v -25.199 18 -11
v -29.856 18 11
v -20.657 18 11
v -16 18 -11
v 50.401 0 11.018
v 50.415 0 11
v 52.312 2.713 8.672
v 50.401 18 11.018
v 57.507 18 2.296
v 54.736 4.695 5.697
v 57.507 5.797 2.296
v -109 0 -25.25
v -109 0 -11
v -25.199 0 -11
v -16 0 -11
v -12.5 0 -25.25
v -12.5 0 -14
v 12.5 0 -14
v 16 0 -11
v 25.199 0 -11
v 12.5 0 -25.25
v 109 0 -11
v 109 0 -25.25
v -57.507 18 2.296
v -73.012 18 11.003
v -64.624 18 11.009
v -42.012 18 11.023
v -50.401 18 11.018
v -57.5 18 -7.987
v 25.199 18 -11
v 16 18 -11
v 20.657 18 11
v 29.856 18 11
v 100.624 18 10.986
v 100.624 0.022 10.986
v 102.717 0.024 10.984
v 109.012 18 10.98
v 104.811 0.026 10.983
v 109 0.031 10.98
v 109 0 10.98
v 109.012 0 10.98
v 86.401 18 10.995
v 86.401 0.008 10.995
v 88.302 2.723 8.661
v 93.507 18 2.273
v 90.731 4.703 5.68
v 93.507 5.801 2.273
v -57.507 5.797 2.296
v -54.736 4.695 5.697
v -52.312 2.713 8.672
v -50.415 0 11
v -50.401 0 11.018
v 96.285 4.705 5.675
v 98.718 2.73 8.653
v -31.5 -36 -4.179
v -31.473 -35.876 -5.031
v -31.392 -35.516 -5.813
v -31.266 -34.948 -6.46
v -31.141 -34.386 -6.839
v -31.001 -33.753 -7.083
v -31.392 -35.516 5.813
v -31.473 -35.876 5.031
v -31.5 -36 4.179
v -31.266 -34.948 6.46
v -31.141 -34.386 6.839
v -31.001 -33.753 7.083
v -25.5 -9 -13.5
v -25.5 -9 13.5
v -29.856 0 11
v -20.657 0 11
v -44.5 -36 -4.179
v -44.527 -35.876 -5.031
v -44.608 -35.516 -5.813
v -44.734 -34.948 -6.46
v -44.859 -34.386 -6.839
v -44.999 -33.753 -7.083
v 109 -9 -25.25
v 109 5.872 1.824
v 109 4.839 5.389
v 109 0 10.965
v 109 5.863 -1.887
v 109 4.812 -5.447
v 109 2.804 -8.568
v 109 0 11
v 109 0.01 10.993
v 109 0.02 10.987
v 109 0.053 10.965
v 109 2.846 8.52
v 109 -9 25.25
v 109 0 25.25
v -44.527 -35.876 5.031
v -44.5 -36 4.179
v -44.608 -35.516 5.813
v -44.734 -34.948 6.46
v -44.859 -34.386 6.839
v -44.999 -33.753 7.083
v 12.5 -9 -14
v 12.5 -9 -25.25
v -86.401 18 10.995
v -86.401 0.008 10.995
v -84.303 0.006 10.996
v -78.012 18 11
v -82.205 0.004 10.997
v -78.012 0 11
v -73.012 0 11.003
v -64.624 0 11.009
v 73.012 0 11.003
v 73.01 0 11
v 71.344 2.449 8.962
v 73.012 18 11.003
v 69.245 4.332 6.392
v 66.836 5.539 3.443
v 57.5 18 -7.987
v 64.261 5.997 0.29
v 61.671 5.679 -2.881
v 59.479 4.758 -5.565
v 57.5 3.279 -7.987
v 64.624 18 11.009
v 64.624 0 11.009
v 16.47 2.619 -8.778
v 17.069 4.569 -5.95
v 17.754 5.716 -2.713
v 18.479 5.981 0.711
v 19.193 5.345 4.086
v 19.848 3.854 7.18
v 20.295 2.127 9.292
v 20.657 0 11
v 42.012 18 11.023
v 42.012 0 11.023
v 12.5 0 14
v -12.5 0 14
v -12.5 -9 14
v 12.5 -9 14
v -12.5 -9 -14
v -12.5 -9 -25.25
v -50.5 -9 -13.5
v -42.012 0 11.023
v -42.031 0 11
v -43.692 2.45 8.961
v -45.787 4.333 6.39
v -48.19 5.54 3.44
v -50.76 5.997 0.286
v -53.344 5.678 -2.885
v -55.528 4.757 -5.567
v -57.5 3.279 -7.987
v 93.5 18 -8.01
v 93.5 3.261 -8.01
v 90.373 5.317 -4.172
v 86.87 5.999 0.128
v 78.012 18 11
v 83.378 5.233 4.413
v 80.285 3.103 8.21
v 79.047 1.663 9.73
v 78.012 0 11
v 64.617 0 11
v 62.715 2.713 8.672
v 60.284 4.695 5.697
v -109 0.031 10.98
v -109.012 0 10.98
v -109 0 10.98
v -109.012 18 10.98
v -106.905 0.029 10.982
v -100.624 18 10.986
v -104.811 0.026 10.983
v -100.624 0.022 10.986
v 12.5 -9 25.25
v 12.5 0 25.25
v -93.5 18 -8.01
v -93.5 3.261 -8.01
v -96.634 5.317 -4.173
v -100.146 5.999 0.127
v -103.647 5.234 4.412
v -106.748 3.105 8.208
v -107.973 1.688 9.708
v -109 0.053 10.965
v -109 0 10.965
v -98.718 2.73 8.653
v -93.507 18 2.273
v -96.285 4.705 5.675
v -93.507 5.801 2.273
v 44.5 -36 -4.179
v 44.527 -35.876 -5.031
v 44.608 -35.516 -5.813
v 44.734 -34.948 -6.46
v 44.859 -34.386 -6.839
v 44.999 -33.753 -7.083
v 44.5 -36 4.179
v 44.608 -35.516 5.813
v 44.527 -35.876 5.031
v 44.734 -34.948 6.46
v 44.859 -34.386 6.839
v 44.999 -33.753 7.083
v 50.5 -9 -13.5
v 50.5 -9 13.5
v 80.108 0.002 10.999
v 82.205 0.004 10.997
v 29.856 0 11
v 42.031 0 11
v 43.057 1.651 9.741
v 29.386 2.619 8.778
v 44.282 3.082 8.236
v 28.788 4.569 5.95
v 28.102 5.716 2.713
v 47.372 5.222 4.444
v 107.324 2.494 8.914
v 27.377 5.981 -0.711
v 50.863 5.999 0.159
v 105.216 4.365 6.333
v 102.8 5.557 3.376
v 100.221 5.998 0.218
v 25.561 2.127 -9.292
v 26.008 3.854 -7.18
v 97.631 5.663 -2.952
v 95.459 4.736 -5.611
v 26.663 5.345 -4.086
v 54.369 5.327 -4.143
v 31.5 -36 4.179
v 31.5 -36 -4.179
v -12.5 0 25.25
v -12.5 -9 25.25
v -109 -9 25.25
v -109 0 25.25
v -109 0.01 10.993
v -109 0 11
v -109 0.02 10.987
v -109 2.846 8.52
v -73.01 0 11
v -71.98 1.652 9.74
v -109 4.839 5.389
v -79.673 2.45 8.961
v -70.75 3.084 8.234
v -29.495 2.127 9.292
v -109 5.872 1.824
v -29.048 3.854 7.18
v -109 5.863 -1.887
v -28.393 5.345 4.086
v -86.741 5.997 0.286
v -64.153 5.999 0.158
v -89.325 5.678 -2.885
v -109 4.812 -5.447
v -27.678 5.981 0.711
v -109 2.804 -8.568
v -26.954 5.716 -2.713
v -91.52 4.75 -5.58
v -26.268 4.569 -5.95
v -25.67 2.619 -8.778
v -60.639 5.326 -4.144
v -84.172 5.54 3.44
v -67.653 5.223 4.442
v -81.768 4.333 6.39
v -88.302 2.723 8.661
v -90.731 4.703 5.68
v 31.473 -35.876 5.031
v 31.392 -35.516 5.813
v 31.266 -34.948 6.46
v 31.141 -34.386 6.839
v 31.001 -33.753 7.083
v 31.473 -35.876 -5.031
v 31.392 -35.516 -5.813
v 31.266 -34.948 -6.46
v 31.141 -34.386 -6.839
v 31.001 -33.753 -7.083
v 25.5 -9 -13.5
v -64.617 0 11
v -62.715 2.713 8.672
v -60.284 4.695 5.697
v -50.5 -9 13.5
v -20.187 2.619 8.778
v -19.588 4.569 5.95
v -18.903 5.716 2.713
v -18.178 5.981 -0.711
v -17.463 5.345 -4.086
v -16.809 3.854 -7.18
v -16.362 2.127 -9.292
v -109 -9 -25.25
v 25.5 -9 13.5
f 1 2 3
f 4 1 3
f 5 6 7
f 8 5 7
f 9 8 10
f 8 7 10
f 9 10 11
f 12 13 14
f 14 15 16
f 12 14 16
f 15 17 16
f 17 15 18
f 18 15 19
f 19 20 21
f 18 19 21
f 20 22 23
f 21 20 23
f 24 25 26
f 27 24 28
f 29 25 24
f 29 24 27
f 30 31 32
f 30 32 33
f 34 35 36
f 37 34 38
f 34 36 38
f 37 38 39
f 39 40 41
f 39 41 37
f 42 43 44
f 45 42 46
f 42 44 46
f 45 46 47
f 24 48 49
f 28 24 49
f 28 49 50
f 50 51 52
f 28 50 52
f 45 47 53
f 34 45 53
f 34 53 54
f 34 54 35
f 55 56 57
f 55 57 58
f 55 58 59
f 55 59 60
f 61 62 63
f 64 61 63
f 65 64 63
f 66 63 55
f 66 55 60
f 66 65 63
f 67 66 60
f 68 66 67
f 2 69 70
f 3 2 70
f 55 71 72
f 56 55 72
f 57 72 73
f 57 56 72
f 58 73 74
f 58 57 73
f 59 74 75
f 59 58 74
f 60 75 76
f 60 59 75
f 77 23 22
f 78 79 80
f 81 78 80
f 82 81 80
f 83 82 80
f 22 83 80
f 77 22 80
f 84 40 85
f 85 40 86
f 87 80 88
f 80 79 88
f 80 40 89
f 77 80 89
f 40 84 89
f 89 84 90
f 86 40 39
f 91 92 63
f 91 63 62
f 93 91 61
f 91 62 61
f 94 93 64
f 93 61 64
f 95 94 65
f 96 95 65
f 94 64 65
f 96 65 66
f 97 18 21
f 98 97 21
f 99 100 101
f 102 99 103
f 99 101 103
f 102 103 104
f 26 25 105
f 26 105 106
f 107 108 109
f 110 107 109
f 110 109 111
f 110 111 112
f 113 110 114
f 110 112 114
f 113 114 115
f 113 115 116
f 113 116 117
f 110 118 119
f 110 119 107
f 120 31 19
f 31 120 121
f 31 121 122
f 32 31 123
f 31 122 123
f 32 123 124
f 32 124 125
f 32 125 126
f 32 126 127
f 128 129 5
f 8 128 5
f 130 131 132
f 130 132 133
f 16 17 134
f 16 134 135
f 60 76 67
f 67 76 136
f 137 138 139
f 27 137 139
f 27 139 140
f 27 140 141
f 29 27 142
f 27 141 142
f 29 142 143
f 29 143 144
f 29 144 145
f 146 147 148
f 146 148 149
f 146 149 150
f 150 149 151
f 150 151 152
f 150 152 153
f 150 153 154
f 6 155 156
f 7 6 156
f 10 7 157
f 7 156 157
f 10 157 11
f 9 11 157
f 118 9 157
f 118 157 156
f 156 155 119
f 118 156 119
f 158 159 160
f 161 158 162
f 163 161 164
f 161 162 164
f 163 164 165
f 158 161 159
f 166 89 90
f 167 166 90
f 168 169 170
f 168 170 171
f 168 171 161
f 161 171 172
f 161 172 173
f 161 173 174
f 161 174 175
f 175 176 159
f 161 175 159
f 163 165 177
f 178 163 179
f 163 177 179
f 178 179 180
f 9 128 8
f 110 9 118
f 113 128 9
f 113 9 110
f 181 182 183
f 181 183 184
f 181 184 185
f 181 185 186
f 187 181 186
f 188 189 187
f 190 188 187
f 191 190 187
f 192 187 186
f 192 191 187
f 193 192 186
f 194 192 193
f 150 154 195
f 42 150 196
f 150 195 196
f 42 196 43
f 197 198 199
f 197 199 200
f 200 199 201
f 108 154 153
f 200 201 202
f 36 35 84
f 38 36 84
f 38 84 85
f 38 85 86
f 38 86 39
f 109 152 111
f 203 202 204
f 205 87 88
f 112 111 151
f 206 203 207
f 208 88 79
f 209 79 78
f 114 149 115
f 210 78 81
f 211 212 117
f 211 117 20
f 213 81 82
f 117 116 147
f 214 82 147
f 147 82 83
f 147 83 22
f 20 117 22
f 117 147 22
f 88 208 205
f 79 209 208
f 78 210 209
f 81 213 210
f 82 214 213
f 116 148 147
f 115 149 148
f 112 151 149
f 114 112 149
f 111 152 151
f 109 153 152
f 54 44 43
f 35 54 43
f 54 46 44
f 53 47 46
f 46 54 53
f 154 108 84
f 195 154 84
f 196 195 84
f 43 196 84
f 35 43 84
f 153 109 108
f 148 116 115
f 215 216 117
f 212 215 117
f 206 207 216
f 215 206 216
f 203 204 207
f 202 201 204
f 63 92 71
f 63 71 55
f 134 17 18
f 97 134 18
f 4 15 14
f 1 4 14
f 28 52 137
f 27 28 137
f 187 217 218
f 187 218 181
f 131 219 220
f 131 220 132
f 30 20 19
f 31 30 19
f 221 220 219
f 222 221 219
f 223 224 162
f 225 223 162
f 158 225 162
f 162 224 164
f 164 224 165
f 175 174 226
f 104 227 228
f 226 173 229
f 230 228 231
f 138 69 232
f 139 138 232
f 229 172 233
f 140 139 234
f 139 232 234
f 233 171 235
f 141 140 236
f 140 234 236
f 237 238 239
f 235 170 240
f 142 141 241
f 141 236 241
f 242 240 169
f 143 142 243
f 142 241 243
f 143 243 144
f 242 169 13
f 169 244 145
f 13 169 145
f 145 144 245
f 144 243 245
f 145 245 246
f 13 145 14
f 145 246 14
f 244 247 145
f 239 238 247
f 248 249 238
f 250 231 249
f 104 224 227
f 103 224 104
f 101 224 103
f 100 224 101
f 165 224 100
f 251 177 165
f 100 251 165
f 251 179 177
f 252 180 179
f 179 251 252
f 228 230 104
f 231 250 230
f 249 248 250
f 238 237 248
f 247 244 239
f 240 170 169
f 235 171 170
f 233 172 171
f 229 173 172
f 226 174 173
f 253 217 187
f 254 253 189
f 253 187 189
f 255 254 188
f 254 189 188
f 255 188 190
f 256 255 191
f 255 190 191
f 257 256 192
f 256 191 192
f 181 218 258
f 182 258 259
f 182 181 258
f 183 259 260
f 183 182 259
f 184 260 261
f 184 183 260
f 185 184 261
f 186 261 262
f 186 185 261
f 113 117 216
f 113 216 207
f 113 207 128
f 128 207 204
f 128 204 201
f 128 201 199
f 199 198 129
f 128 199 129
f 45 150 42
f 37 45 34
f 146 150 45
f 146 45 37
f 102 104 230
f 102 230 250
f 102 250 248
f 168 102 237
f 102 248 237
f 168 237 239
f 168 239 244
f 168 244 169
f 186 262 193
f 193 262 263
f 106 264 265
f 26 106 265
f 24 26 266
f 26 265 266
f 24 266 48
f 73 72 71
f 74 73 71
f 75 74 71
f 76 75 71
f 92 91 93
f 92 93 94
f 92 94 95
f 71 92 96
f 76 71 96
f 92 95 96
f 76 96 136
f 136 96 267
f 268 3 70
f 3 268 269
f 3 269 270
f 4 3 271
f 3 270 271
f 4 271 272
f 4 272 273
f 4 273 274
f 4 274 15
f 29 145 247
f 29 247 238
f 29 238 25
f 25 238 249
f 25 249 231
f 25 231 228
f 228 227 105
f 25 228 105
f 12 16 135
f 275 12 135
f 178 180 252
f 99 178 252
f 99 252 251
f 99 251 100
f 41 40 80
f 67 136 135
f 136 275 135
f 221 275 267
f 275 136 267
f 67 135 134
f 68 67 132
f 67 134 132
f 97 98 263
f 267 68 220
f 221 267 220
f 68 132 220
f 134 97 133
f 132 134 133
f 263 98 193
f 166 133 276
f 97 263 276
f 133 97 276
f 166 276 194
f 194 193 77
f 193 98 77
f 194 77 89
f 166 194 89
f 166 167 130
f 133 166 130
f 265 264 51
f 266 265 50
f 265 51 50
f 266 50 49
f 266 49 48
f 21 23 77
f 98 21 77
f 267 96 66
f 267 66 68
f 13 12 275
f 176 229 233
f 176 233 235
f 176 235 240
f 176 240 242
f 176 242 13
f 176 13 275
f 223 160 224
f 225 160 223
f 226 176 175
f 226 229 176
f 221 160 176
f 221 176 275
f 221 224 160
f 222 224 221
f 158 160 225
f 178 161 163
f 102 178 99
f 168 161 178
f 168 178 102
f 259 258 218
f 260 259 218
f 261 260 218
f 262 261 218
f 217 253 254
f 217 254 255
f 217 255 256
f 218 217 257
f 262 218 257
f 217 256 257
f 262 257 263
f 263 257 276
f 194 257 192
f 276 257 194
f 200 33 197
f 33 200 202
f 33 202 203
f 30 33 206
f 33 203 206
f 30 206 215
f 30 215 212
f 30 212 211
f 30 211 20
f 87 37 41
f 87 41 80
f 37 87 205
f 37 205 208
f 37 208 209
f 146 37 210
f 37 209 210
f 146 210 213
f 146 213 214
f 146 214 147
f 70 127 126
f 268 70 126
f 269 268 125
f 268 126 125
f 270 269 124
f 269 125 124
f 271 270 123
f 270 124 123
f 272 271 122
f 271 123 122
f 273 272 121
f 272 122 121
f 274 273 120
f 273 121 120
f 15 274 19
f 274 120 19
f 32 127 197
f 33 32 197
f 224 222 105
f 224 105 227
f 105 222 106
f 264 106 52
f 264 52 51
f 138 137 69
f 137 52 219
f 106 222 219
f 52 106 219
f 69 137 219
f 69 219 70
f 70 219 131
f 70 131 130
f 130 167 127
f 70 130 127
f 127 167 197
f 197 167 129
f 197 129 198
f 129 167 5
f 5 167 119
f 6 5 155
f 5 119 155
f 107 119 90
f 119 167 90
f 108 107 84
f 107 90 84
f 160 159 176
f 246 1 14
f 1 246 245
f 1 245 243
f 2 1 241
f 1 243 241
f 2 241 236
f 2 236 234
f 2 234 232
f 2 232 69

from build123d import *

# Parameters (mm, degrees)
EXTRUDE_1_DEPTH     = 109
EXTRUDE_2_DEPTH     = 18
SKETCH_3_W          = 25
SKETCH_3_H          = 11.25
CUT_EXTRUDE_1_DEPTH = 18
SKETCH_4_W          = 25
SKETCH_4_H          = 27
EXTRUDE_3_DEPTH     = 27
CUT_EXTRUDE_2_DEPTH = 122.166018853
CUT_EXTRUDE_3_DEPTH = 166.462013552
FILLET_1_R          = 3


# Read off the part's stored shape, not the designer's step: Бобышка-Вытянуть2
with BuildPart() as part:
    # Эскиз1 → Бобышка-Вытянуть1 (new, symmetric)
    with BuildSketch(Plane(origin=(0, 0, 0), x_dir=(0, 0, -1), z_dir=(1, 0, 0))):
        with BuildLine():
            Line((11, 0), (25.25, 0))
            Line((25.25, 0), (25.25, -9))
            Line((25.25, -9), (-25.25, -9))
            Line((-25.25, -9), (-25.25, 0))
            Line((-25.25, 0), (-11, 0))
            ThreePointArc((-11, 0), (0, 6), (11, 0))
        make_face()
    extrude(amount=EXTRUDE_1_DEPTH, both=True)

    # Бобышка-Вытянуть2 outline → Бобышка-Вытянуть2 (add)
    with BuildSketch(Plane(origin=(0, 0, 0), x_dir=(1, 0, 0), z_dir=(0, 1, 0))):
        Polygon((16, 11), (20.656976684, -11), (29.856406461, -11), (25.199429777, 11), align=None)
        Polygon((-29.856406461, -11), (-20.656976684, -11), (-16, 11), (-25.199429777, 11), align=None)
        Polygon((78.012123179, -10.999996132), (86.400679256, -10.994643711), (93.506557878, -2.272856192), (100.623560797, -10.985568626), (109.012116871, -10.980216204), (93.499996845, 8.009889964), align=None)
        Polygon((64.623554487, -11.008538874), (73.012110561, -11.003186452), (57.499990534, 7.986919716), (42.012116871, -11.02296638), (50.400672946, -11.017613959), (57.506551567, -2.29582644), align=None)
        Polygon((-109.012116871, -10.980216204), (-100.623560797, -10.985568626), (-93.506557878, -2.272856192), (-86.400679256, -10.994643711), (-78.012123179, -10.999996132), (-93.499996845, 8.009889964), align=None)
        Polygon((-73.012110561, -11.003186452), (-64.623554487, -11.008538874), (-57.506551567, -2.29582644), (-50.400672946, -11.017613959), (-42.012116871, -11.02296638), (-57.499990534, 7.986919716), align=None)
    extrude(amount=EXTRUDE_2_DEPTH)

    # Эскиз3 → Вырез-Вытянуть1 (cut)
    with BuildSketch(Plane(origin=(0, 0, 0), x_dir=(1, 0, 0), z_dir=(0, 1, 0))):
        with Locations((0, 19.625)):
            Rectangle(SKETCH_3_W, SKETCH_3_H)
        with Locations((0, -19.625)):
            Rectangle(SKETCH_3_W, SKETCH_3_H)
    extrude(amount=-CUT_EXTRUDE_1_DEPTH, mode=Mode.SUBTRACT)

    # Эскиз4 → Бобышка-Вытянуть3 (add)
    with BuildSketch(Plane.XZ.offset(9)):
        with Locations((38, 0)):
            Rectangle(SKETCH_4_W, SKETCH_4_H)
        with Locations((-38, 0)):
            Rectangle(SKETCH_4_W, SKETCH_4_H)
    extrude(amount=EXTRUDE_3_DEPTH)

    # Эскиз6 → Вырез-Вытянуть2 (cut, through all)
    with BuildSketch(Plane.XY.offset(13.5)):
        Polygon((-50.5, -9), (-50.5, -36), (-44.5, -36), align=None)
        Polygon((-25.5, -36), (-31.5, -36), (-25.5, -9), align=None)
        Polygon((25.5, -9), (25.5, -36), (31.5, -36), align=None)
        Polygon((50.5, -36), (44.5, -36), (50.5, -9), align=None)
    extrude(amount=-CUT_EXTRUDE_2_DEPTH, mode=Mode.SUBTRACT)

    # Эскиз5 → Вырез-Вытянуть3 (cut, through all)
    with BuildSketch(Plane.ZY.offset(50.5)):
        Polygon((-13.5, -9), (-13.5, -36), (-6.5, -36), align=None)
        Polygon((13.5, -36), (6.5, -36), (13.5, -9), align=None)
    extrude(amount=-CUT_EXTRUDE_3_DEPTH, mode=Mode.SUBTRACT)

    # Скругление1
    fillet_1_edges = [part.edges().sort_by_distance(p)[0] for p in [
        (-38, -36, -6.5),
        (38, -36, -6.5),
        (-38, -36, 6.5),
        (38, -36, 6.5),
    ]]
    fillet(fillet_1_edges, radius=FILLET_1_R)


solid = part.part
